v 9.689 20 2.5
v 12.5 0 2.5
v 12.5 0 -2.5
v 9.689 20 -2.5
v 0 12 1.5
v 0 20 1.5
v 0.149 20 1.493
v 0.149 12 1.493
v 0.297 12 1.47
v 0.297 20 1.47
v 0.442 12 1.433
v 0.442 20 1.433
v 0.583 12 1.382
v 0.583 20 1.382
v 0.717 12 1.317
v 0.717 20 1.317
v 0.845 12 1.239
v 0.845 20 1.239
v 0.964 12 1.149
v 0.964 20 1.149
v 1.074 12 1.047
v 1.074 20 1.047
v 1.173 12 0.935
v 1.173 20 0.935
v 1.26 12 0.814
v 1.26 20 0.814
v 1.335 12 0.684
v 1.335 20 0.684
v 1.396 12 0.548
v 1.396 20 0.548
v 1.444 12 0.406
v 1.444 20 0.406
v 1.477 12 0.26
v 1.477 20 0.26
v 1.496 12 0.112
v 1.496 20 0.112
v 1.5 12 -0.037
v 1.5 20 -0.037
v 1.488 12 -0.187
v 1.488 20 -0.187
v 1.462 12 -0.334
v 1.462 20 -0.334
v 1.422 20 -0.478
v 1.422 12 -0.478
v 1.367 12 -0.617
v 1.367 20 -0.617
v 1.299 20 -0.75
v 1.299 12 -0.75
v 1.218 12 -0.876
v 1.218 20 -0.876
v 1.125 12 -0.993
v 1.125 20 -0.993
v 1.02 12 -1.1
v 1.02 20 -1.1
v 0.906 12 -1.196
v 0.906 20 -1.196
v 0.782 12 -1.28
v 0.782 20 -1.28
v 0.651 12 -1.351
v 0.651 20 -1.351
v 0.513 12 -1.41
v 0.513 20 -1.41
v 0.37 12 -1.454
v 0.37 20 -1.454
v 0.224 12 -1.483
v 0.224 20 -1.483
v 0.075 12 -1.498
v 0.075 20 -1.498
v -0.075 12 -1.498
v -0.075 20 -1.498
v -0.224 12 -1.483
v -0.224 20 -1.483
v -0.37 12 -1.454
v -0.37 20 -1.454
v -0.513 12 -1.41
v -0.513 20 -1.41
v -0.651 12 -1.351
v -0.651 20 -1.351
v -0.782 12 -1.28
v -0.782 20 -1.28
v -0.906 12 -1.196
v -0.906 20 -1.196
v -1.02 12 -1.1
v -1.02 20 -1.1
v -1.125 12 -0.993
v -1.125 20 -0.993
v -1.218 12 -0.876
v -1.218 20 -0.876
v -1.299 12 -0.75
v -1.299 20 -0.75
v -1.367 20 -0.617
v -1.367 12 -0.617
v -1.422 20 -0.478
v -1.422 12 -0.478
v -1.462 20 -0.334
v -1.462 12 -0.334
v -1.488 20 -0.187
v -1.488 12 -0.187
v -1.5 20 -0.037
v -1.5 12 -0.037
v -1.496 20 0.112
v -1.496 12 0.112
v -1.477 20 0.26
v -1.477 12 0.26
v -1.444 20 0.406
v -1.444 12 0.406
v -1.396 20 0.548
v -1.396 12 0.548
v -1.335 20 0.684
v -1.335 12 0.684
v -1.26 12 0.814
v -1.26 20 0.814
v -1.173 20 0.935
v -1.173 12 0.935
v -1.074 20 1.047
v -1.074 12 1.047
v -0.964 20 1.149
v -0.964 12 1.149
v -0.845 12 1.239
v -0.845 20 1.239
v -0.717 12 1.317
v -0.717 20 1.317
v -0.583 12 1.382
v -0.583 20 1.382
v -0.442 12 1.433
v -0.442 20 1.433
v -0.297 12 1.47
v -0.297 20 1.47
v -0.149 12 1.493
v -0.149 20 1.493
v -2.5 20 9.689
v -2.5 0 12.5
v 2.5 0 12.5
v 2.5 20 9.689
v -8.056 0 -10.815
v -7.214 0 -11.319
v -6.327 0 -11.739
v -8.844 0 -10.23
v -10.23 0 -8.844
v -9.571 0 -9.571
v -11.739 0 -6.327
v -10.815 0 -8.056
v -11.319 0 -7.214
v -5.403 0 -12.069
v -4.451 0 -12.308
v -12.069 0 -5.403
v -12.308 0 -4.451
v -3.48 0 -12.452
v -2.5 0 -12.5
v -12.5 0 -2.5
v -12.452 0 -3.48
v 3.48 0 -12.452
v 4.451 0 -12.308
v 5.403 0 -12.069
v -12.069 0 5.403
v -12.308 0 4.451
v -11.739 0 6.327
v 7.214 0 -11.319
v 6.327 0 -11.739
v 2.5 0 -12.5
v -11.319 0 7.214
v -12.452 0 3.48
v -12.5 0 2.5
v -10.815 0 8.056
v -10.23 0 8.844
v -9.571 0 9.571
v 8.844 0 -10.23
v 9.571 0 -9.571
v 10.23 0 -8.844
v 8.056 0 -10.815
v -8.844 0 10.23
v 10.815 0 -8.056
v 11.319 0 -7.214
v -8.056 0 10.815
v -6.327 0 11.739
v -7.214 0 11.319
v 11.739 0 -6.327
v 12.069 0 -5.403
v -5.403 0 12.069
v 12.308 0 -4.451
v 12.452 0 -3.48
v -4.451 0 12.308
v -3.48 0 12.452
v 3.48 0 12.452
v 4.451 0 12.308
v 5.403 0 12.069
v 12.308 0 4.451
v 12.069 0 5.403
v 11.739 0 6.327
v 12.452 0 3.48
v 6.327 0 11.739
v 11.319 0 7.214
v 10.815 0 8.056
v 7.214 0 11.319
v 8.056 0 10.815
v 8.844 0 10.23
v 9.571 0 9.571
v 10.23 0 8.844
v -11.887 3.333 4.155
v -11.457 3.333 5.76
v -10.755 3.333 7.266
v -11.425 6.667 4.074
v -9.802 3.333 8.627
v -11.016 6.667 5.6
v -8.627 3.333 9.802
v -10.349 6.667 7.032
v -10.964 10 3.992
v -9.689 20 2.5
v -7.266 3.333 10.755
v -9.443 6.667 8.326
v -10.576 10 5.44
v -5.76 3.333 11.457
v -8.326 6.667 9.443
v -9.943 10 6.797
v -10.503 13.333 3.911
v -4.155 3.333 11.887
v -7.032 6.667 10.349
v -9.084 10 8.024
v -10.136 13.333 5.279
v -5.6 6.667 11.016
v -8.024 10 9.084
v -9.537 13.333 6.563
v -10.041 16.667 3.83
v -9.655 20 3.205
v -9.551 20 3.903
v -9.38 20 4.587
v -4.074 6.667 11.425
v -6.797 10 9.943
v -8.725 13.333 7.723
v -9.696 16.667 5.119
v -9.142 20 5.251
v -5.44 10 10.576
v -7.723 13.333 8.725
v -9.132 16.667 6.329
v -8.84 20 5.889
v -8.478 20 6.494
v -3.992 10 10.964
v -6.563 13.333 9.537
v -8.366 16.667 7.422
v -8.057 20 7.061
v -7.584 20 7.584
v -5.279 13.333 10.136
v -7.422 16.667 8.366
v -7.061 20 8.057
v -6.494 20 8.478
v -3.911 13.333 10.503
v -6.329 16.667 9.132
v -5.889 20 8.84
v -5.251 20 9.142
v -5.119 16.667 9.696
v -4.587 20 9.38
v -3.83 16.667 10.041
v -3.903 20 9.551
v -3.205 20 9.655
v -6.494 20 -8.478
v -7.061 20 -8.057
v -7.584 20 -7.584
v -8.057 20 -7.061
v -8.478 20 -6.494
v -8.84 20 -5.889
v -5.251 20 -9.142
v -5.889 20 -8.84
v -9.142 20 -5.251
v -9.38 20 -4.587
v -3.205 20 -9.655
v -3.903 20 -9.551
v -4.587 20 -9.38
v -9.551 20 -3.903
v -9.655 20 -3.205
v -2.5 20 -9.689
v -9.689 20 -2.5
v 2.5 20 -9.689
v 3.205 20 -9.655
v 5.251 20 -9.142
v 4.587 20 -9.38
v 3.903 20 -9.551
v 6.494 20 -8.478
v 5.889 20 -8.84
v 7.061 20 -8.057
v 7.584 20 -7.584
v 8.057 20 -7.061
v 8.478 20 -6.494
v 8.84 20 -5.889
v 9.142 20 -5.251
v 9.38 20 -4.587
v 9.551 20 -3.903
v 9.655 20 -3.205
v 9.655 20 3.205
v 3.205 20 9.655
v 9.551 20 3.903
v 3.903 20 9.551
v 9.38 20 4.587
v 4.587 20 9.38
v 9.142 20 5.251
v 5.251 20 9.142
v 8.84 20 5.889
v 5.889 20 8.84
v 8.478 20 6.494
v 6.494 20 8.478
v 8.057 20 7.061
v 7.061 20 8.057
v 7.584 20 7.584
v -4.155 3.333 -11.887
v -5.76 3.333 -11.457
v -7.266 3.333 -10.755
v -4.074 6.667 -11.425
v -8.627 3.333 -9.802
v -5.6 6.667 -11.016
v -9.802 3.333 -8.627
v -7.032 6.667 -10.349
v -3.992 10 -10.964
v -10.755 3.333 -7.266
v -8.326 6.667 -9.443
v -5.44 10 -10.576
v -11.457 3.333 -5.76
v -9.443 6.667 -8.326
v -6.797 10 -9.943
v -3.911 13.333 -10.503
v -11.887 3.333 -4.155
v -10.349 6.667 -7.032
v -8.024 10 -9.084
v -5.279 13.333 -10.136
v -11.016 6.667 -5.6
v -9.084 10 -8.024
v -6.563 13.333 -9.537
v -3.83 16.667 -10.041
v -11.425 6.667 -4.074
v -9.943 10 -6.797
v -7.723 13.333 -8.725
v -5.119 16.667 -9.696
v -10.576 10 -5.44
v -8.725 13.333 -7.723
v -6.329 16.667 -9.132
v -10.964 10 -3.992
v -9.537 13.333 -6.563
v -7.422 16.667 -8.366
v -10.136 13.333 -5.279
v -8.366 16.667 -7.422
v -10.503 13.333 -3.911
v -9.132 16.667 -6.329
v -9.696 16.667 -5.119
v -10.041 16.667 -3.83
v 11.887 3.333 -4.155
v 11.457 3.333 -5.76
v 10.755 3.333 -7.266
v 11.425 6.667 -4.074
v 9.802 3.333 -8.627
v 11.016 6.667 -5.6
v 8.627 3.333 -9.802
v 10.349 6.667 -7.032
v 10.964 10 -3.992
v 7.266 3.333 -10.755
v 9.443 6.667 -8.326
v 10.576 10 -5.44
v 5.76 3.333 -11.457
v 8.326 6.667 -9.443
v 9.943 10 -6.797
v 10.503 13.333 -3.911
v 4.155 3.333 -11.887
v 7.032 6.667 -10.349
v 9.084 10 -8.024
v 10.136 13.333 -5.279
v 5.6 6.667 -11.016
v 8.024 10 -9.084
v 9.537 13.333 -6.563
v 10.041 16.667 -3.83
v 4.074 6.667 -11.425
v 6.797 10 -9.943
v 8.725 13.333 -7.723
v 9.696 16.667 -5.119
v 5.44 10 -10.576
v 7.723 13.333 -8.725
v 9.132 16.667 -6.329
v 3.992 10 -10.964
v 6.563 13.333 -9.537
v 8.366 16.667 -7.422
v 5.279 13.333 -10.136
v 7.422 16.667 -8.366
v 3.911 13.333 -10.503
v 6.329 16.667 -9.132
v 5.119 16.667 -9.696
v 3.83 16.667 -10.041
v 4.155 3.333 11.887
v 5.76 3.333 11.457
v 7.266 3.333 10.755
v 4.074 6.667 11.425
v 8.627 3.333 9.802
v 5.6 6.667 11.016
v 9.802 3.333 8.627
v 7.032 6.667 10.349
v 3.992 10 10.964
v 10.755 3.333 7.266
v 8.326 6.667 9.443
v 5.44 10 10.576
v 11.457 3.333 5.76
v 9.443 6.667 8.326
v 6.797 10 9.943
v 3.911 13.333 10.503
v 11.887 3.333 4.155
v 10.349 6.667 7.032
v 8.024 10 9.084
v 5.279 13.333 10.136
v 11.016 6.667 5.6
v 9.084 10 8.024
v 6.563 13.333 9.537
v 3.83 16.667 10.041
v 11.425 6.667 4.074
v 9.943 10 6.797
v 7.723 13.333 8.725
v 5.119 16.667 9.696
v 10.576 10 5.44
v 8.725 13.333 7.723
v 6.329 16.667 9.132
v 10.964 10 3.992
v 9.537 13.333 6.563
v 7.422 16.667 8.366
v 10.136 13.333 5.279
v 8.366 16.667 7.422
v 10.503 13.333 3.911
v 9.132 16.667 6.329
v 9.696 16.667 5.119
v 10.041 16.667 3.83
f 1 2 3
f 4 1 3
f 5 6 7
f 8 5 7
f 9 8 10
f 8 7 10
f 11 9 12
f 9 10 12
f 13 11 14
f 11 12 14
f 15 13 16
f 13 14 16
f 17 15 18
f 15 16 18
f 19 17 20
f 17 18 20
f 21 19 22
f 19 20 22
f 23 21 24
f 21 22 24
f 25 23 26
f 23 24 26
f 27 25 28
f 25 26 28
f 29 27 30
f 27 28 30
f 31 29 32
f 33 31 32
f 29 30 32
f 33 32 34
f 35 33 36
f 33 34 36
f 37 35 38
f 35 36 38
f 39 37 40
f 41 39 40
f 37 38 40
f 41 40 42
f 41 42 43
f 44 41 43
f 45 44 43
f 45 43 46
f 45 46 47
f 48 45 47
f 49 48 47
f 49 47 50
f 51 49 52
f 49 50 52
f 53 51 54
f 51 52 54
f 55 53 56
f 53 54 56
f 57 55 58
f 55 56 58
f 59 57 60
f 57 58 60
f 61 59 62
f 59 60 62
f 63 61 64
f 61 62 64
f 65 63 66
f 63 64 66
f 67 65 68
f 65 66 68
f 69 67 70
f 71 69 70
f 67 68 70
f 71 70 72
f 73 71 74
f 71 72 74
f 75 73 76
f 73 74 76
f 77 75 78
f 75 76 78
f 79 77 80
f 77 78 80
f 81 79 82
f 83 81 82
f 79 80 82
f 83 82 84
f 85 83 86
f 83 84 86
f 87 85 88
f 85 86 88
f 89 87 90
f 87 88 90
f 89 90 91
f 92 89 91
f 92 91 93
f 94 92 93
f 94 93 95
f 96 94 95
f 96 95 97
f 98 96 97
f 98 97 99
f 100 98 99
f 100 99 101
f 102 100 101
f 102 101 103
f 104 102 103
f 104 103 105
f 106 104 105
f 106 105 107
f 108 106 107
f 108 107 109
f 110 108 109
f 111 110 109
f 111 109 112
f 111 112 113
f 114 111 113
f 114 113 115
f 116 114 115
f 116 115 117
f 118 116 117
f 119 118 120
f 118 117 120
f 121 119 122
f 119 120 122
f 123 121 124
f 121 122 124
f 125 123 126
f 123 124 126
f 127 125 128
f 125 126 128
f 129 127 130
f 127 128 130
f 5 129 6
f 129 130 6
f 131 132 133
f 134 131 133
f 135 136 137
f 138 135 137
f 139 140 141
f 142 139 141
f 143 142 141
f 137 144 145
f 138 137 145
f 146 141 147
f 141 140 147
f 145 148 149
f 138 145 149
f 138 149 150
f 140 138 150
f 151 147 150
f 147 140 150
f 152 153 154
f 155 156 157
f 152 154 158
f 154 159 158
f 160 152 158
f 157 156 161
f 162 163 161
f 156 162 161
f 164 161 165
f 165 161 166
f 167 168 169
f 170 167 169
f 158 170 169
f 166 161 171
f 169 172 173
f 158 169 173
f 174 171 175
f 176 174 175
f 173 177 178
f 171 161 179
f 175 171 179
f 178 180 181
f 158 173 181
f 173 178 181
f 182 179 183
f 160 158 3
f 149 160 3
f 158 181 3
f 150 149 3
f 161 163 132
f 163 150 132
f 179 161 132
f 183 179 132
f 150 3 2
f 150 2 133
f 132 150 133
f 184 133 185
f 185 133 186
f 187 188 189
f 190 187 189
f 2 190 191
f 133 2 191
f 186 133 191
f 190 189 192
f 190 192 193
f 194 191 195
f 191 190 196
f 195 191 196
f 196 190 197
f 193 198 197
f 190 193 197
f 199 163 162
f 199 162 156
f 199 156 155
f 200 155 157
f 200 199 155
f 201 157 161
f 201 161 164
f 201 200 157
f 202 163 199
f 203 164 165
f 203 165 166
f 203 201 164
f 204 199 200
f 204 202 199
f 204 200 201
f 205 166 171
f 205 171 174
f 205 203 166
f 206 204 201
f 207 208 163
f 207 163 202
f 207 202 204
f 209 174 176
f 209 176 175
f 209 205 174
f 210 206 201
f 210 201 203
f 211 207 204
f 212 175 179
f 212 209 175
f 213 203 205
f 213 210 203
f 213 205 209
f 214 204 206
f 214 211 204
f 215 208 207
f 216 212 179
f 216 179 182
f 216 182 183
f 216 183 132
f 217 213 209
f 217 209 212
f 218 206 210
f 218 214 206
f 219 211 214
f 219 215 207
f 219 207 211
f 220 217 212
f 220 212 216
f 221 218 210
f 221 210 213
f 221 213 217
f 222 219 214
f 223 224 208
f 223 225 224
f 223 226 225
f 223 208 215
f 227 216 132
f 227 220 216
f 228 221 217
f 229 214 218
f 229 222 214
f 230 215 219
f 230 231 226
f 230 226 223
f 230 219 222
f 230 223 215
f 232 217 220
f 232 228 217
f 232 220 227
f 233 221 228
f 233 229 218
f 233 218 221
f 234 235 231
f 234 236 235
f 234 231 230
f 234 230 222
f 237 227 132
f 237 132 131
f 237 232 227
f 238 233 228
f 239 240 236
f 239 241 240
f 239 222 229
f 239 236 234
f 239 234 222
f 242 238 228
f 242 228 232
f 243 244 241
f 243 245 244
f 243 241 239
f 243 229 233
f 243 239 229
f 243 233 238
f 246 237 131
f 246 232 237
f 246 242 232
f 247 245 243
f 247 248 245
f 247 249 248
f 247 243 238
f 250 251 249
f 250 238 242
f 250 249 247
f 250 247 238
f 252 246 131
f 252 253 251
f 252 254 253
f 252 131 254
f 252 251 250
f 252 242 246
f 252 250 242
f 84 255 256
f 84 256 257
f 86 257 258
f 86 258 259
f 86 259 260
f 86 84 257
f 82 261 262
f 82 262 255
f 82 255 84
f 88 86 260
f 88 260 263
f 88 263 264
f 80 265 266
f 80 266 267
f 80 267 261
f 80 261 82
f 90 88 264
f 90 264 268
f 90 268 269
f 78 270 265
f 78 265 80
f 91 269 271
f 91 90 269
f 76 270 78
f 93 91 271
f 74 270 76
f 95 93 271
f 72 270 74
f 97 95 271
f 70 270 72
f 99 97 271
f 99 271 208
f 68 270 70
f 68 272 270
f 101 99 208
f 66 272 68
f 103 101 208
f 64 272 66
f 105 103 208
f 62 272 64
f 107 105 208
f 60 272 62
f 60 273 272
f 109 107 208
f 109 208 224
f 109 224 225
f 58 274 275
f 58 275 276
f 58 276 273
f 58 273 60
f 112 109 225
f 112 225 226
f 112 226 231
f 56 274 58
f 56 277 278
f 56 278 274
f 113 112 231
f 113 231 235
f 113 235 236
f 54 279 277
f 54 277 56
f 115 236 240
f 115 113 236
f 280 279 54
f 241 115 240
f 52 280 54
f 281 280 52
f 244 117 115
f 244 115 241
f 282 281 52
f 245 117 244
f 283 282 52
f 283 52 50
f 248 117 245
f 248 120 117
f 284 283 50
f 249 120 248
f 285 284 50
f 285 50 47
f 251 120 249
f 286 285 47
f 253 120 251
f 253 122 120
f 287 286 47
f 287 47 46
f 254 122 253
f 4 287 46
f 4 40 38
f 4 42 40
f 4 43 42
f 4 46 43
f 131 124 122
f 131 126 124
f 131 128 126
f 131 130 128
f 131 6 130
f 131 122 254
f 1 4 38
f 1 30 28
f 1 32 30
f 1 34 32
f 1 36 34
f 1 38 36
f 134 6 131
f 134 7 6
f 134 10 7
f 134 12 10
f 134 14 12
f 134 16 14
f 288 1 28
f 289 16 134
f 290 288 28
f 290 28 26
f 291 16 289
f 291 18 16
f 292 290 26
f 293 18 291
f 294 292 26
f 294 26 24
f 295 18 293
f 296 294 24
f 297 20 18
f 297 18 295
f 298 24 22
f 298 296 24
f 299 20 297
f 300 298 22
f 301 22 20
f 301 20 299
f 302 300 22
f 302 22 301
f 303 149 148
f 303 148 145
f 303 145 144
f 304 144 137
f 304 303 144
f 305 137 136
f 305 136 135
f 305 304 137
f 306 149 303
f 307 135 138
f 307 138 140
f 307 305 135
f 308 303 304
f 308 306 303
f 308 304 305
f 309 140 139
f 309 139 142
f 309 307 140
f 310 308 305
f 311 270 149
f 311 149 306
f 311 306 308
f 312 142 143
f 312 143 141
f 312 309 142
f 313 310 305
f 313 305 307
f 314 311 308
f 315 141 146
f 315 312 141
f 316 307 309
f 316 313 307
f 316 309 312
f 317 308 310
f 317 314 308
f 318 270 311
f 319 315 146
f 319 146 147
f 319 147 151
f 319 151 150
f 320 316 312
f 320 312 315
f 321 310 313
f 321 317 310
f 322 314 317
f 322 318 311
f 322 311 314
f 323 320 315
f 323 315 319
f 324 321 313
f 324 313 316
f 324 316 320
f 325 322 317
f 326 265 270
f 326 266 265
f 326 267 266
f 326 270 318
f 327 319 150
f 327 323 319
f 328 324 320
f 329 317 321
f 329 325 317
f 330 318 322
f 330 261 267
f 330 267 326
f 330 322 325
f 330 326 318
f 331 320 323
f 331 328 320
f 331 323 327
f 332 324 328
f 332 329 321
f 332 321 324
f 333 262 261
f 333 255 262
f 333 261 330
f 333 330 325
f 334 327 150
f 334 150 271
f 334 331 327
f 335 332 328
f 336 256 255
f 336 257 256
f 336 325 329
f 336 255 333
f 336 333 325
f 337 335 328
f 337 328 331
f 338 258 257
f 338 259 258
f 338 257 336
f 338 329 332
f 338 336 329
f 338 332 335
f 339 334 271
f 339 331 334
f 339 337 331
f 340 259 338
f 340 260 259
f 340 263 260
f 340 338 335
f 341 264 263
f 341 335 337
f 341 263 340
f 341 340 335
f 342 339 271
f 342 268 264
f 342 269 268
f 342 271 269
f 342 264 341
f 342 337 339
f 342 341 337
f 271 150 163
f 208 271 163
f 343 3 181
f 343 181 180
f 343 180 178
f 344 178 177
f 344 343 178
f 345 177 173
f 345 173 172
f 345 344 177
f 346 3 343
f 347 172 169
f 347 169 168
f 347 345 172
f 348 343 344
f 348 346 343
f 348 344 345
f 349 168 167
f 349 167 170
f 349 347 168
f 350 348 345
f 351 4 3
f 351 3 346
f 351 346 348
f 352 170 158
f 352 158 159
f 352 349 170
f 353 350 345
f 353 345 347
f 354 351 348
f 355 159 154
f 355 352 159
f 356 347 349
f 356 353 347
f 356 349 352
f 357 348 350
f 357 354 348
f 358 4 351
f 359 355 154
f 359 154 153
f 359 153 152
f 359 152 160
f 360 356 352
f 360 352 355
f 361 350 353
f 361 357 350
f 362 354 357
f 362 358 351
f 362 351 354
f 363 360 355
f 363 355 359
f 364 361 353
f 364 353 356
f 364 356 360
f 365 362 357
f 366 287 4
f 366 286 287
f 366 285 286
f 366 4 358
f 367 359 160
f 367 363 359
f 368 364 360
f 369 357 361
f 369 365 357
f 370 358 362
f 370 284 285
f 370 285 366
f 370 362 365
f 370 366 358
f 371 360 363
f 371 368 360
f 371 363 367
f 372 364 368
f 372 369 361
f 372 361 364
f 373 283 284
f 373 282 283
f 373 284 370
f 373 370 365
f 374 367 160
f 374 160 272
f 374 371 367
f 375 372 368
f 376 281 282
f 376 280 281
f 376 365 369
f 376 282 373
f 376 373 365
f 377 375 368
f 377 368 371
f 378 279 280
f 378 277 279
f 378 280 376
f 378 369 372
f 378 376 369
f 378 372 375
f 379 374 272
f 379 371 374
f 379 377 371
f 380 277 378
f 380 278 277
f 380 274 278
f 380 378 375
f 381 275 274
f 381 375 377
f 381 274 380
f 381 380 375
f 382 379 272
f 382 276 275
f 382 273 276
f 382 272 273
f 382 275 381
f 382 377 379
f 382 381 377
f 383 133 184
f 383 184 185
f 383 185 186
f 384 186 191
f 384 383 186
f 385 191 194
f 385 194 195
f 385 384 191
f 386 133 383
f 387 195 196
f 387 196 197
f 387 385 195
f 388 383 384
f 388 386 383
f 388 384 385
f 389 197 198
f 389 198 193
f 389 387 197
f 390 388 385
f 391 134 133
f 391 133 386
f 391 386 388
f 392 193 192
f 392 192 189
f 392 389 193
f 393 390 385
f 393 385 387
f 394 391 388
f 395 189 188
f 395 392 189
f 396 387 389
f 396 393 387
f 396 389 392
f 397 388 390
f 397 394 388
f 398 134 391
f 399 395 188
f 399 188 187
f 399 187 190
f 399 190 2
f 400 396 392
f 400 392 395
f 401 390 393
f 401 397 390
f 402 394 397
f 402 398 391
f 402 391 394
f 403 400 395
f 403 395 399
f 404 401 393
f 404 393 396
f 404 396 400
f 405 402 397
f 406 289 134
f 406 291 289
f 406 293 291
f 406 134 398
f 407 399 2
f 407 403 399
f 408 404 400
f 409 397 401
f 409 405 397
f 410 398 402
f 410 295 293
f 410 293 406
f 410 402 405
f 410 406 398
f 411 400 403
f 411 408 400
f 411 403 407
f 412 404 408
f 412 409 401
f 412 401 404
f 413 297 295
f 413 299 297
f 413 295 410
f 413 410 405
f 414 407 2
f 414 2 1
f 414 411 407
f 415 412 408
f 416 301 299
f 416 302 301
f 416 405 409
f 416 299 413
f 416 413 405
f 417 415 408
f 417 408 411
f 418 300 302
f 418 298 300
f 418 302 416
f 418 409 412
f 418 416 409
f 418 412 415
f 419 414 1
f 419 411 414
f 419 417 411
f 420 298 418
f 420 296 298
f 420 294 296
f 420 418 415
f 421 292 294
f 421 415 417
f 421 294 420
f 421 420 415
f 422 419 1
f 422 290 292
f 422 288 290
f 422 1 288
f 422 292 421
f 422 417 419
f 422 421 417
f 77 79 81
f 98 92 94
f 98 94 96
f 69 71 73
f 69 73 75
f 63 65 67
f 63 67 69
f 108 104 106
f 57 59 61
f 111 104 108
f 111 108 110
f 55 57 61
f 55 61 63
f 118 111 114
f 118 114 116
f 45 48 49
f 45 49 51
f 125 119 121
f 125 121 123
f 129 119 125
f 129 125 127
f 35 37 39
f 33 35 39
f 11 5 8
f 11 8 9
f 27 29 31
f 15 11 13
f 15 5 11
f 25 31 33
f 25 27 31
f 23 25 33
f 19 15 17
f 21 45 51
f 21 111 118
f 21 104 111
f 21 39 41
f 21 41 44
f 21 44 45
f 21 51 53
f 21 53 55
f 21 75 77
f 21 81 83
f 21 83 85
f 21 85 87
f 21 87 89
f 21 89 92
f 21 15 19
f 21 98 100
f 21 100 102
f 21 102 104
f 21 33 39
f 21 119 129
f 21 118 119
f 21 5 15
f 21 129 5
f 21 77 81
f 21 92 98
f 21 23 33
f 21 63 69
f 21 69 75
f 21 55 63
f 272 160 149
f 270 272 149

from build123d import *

# Parameters (mm, degrees)
BODY_DEPTH  = 20
BODY_TAPER  = 8
SKETCH2_R   = 1.5
SCREW_DEPTH = 8


with BuildPart() as part:
    # Sketch1 → Body (new body)
    with BuildSketch(Plane(origin=(0, 0, 0), x_dir=(1, 0, 0), z_dir=(0, 1, 0))):
        with BuildLine():
            ThreePointArc((2.5, -12.5), (9.571067812, -9.571067812), (12.5, -2.5))
            Line((12.5, -2.5), (12.5, 2.5))
            ThreePointArc((12.5, 2.5), (9.571067812, 9.571067812), (2.5, 12.5))
            Line((2.5, 12.5), (-2.5, 12.5))
            ThreePointArc((-2.5, 12.5), (-9.571067812, 9.571067812), (-12.5, 2.5))
            Line((-12.5, 2.5), (-12.5, -2.5))
            ThreePointArc((-12.5, -2.5), (-9.571067812, -9.571067812), (-2.5, -12.5))
            Line((-2.5, -12.5), (2.5, -12.5))
        make_face()
    extrude(amount=BODY_DEPTH, taper=BODY_TAPER)

    # Sketch2 → Screw (cut)
    with BuildSketch(Plane(origin=(0, 20, 0), x_dir=(1, 0, 0), z_dir=(0, 1, 0))):
        with Locations(Location((0, 0, 0), (0, 0, 270))):
            Circle(SKETCH2_R)
    extrude(amount=-SCREW_DEPTH, mode=Mode.SUBTRACT)


solid = part.part
